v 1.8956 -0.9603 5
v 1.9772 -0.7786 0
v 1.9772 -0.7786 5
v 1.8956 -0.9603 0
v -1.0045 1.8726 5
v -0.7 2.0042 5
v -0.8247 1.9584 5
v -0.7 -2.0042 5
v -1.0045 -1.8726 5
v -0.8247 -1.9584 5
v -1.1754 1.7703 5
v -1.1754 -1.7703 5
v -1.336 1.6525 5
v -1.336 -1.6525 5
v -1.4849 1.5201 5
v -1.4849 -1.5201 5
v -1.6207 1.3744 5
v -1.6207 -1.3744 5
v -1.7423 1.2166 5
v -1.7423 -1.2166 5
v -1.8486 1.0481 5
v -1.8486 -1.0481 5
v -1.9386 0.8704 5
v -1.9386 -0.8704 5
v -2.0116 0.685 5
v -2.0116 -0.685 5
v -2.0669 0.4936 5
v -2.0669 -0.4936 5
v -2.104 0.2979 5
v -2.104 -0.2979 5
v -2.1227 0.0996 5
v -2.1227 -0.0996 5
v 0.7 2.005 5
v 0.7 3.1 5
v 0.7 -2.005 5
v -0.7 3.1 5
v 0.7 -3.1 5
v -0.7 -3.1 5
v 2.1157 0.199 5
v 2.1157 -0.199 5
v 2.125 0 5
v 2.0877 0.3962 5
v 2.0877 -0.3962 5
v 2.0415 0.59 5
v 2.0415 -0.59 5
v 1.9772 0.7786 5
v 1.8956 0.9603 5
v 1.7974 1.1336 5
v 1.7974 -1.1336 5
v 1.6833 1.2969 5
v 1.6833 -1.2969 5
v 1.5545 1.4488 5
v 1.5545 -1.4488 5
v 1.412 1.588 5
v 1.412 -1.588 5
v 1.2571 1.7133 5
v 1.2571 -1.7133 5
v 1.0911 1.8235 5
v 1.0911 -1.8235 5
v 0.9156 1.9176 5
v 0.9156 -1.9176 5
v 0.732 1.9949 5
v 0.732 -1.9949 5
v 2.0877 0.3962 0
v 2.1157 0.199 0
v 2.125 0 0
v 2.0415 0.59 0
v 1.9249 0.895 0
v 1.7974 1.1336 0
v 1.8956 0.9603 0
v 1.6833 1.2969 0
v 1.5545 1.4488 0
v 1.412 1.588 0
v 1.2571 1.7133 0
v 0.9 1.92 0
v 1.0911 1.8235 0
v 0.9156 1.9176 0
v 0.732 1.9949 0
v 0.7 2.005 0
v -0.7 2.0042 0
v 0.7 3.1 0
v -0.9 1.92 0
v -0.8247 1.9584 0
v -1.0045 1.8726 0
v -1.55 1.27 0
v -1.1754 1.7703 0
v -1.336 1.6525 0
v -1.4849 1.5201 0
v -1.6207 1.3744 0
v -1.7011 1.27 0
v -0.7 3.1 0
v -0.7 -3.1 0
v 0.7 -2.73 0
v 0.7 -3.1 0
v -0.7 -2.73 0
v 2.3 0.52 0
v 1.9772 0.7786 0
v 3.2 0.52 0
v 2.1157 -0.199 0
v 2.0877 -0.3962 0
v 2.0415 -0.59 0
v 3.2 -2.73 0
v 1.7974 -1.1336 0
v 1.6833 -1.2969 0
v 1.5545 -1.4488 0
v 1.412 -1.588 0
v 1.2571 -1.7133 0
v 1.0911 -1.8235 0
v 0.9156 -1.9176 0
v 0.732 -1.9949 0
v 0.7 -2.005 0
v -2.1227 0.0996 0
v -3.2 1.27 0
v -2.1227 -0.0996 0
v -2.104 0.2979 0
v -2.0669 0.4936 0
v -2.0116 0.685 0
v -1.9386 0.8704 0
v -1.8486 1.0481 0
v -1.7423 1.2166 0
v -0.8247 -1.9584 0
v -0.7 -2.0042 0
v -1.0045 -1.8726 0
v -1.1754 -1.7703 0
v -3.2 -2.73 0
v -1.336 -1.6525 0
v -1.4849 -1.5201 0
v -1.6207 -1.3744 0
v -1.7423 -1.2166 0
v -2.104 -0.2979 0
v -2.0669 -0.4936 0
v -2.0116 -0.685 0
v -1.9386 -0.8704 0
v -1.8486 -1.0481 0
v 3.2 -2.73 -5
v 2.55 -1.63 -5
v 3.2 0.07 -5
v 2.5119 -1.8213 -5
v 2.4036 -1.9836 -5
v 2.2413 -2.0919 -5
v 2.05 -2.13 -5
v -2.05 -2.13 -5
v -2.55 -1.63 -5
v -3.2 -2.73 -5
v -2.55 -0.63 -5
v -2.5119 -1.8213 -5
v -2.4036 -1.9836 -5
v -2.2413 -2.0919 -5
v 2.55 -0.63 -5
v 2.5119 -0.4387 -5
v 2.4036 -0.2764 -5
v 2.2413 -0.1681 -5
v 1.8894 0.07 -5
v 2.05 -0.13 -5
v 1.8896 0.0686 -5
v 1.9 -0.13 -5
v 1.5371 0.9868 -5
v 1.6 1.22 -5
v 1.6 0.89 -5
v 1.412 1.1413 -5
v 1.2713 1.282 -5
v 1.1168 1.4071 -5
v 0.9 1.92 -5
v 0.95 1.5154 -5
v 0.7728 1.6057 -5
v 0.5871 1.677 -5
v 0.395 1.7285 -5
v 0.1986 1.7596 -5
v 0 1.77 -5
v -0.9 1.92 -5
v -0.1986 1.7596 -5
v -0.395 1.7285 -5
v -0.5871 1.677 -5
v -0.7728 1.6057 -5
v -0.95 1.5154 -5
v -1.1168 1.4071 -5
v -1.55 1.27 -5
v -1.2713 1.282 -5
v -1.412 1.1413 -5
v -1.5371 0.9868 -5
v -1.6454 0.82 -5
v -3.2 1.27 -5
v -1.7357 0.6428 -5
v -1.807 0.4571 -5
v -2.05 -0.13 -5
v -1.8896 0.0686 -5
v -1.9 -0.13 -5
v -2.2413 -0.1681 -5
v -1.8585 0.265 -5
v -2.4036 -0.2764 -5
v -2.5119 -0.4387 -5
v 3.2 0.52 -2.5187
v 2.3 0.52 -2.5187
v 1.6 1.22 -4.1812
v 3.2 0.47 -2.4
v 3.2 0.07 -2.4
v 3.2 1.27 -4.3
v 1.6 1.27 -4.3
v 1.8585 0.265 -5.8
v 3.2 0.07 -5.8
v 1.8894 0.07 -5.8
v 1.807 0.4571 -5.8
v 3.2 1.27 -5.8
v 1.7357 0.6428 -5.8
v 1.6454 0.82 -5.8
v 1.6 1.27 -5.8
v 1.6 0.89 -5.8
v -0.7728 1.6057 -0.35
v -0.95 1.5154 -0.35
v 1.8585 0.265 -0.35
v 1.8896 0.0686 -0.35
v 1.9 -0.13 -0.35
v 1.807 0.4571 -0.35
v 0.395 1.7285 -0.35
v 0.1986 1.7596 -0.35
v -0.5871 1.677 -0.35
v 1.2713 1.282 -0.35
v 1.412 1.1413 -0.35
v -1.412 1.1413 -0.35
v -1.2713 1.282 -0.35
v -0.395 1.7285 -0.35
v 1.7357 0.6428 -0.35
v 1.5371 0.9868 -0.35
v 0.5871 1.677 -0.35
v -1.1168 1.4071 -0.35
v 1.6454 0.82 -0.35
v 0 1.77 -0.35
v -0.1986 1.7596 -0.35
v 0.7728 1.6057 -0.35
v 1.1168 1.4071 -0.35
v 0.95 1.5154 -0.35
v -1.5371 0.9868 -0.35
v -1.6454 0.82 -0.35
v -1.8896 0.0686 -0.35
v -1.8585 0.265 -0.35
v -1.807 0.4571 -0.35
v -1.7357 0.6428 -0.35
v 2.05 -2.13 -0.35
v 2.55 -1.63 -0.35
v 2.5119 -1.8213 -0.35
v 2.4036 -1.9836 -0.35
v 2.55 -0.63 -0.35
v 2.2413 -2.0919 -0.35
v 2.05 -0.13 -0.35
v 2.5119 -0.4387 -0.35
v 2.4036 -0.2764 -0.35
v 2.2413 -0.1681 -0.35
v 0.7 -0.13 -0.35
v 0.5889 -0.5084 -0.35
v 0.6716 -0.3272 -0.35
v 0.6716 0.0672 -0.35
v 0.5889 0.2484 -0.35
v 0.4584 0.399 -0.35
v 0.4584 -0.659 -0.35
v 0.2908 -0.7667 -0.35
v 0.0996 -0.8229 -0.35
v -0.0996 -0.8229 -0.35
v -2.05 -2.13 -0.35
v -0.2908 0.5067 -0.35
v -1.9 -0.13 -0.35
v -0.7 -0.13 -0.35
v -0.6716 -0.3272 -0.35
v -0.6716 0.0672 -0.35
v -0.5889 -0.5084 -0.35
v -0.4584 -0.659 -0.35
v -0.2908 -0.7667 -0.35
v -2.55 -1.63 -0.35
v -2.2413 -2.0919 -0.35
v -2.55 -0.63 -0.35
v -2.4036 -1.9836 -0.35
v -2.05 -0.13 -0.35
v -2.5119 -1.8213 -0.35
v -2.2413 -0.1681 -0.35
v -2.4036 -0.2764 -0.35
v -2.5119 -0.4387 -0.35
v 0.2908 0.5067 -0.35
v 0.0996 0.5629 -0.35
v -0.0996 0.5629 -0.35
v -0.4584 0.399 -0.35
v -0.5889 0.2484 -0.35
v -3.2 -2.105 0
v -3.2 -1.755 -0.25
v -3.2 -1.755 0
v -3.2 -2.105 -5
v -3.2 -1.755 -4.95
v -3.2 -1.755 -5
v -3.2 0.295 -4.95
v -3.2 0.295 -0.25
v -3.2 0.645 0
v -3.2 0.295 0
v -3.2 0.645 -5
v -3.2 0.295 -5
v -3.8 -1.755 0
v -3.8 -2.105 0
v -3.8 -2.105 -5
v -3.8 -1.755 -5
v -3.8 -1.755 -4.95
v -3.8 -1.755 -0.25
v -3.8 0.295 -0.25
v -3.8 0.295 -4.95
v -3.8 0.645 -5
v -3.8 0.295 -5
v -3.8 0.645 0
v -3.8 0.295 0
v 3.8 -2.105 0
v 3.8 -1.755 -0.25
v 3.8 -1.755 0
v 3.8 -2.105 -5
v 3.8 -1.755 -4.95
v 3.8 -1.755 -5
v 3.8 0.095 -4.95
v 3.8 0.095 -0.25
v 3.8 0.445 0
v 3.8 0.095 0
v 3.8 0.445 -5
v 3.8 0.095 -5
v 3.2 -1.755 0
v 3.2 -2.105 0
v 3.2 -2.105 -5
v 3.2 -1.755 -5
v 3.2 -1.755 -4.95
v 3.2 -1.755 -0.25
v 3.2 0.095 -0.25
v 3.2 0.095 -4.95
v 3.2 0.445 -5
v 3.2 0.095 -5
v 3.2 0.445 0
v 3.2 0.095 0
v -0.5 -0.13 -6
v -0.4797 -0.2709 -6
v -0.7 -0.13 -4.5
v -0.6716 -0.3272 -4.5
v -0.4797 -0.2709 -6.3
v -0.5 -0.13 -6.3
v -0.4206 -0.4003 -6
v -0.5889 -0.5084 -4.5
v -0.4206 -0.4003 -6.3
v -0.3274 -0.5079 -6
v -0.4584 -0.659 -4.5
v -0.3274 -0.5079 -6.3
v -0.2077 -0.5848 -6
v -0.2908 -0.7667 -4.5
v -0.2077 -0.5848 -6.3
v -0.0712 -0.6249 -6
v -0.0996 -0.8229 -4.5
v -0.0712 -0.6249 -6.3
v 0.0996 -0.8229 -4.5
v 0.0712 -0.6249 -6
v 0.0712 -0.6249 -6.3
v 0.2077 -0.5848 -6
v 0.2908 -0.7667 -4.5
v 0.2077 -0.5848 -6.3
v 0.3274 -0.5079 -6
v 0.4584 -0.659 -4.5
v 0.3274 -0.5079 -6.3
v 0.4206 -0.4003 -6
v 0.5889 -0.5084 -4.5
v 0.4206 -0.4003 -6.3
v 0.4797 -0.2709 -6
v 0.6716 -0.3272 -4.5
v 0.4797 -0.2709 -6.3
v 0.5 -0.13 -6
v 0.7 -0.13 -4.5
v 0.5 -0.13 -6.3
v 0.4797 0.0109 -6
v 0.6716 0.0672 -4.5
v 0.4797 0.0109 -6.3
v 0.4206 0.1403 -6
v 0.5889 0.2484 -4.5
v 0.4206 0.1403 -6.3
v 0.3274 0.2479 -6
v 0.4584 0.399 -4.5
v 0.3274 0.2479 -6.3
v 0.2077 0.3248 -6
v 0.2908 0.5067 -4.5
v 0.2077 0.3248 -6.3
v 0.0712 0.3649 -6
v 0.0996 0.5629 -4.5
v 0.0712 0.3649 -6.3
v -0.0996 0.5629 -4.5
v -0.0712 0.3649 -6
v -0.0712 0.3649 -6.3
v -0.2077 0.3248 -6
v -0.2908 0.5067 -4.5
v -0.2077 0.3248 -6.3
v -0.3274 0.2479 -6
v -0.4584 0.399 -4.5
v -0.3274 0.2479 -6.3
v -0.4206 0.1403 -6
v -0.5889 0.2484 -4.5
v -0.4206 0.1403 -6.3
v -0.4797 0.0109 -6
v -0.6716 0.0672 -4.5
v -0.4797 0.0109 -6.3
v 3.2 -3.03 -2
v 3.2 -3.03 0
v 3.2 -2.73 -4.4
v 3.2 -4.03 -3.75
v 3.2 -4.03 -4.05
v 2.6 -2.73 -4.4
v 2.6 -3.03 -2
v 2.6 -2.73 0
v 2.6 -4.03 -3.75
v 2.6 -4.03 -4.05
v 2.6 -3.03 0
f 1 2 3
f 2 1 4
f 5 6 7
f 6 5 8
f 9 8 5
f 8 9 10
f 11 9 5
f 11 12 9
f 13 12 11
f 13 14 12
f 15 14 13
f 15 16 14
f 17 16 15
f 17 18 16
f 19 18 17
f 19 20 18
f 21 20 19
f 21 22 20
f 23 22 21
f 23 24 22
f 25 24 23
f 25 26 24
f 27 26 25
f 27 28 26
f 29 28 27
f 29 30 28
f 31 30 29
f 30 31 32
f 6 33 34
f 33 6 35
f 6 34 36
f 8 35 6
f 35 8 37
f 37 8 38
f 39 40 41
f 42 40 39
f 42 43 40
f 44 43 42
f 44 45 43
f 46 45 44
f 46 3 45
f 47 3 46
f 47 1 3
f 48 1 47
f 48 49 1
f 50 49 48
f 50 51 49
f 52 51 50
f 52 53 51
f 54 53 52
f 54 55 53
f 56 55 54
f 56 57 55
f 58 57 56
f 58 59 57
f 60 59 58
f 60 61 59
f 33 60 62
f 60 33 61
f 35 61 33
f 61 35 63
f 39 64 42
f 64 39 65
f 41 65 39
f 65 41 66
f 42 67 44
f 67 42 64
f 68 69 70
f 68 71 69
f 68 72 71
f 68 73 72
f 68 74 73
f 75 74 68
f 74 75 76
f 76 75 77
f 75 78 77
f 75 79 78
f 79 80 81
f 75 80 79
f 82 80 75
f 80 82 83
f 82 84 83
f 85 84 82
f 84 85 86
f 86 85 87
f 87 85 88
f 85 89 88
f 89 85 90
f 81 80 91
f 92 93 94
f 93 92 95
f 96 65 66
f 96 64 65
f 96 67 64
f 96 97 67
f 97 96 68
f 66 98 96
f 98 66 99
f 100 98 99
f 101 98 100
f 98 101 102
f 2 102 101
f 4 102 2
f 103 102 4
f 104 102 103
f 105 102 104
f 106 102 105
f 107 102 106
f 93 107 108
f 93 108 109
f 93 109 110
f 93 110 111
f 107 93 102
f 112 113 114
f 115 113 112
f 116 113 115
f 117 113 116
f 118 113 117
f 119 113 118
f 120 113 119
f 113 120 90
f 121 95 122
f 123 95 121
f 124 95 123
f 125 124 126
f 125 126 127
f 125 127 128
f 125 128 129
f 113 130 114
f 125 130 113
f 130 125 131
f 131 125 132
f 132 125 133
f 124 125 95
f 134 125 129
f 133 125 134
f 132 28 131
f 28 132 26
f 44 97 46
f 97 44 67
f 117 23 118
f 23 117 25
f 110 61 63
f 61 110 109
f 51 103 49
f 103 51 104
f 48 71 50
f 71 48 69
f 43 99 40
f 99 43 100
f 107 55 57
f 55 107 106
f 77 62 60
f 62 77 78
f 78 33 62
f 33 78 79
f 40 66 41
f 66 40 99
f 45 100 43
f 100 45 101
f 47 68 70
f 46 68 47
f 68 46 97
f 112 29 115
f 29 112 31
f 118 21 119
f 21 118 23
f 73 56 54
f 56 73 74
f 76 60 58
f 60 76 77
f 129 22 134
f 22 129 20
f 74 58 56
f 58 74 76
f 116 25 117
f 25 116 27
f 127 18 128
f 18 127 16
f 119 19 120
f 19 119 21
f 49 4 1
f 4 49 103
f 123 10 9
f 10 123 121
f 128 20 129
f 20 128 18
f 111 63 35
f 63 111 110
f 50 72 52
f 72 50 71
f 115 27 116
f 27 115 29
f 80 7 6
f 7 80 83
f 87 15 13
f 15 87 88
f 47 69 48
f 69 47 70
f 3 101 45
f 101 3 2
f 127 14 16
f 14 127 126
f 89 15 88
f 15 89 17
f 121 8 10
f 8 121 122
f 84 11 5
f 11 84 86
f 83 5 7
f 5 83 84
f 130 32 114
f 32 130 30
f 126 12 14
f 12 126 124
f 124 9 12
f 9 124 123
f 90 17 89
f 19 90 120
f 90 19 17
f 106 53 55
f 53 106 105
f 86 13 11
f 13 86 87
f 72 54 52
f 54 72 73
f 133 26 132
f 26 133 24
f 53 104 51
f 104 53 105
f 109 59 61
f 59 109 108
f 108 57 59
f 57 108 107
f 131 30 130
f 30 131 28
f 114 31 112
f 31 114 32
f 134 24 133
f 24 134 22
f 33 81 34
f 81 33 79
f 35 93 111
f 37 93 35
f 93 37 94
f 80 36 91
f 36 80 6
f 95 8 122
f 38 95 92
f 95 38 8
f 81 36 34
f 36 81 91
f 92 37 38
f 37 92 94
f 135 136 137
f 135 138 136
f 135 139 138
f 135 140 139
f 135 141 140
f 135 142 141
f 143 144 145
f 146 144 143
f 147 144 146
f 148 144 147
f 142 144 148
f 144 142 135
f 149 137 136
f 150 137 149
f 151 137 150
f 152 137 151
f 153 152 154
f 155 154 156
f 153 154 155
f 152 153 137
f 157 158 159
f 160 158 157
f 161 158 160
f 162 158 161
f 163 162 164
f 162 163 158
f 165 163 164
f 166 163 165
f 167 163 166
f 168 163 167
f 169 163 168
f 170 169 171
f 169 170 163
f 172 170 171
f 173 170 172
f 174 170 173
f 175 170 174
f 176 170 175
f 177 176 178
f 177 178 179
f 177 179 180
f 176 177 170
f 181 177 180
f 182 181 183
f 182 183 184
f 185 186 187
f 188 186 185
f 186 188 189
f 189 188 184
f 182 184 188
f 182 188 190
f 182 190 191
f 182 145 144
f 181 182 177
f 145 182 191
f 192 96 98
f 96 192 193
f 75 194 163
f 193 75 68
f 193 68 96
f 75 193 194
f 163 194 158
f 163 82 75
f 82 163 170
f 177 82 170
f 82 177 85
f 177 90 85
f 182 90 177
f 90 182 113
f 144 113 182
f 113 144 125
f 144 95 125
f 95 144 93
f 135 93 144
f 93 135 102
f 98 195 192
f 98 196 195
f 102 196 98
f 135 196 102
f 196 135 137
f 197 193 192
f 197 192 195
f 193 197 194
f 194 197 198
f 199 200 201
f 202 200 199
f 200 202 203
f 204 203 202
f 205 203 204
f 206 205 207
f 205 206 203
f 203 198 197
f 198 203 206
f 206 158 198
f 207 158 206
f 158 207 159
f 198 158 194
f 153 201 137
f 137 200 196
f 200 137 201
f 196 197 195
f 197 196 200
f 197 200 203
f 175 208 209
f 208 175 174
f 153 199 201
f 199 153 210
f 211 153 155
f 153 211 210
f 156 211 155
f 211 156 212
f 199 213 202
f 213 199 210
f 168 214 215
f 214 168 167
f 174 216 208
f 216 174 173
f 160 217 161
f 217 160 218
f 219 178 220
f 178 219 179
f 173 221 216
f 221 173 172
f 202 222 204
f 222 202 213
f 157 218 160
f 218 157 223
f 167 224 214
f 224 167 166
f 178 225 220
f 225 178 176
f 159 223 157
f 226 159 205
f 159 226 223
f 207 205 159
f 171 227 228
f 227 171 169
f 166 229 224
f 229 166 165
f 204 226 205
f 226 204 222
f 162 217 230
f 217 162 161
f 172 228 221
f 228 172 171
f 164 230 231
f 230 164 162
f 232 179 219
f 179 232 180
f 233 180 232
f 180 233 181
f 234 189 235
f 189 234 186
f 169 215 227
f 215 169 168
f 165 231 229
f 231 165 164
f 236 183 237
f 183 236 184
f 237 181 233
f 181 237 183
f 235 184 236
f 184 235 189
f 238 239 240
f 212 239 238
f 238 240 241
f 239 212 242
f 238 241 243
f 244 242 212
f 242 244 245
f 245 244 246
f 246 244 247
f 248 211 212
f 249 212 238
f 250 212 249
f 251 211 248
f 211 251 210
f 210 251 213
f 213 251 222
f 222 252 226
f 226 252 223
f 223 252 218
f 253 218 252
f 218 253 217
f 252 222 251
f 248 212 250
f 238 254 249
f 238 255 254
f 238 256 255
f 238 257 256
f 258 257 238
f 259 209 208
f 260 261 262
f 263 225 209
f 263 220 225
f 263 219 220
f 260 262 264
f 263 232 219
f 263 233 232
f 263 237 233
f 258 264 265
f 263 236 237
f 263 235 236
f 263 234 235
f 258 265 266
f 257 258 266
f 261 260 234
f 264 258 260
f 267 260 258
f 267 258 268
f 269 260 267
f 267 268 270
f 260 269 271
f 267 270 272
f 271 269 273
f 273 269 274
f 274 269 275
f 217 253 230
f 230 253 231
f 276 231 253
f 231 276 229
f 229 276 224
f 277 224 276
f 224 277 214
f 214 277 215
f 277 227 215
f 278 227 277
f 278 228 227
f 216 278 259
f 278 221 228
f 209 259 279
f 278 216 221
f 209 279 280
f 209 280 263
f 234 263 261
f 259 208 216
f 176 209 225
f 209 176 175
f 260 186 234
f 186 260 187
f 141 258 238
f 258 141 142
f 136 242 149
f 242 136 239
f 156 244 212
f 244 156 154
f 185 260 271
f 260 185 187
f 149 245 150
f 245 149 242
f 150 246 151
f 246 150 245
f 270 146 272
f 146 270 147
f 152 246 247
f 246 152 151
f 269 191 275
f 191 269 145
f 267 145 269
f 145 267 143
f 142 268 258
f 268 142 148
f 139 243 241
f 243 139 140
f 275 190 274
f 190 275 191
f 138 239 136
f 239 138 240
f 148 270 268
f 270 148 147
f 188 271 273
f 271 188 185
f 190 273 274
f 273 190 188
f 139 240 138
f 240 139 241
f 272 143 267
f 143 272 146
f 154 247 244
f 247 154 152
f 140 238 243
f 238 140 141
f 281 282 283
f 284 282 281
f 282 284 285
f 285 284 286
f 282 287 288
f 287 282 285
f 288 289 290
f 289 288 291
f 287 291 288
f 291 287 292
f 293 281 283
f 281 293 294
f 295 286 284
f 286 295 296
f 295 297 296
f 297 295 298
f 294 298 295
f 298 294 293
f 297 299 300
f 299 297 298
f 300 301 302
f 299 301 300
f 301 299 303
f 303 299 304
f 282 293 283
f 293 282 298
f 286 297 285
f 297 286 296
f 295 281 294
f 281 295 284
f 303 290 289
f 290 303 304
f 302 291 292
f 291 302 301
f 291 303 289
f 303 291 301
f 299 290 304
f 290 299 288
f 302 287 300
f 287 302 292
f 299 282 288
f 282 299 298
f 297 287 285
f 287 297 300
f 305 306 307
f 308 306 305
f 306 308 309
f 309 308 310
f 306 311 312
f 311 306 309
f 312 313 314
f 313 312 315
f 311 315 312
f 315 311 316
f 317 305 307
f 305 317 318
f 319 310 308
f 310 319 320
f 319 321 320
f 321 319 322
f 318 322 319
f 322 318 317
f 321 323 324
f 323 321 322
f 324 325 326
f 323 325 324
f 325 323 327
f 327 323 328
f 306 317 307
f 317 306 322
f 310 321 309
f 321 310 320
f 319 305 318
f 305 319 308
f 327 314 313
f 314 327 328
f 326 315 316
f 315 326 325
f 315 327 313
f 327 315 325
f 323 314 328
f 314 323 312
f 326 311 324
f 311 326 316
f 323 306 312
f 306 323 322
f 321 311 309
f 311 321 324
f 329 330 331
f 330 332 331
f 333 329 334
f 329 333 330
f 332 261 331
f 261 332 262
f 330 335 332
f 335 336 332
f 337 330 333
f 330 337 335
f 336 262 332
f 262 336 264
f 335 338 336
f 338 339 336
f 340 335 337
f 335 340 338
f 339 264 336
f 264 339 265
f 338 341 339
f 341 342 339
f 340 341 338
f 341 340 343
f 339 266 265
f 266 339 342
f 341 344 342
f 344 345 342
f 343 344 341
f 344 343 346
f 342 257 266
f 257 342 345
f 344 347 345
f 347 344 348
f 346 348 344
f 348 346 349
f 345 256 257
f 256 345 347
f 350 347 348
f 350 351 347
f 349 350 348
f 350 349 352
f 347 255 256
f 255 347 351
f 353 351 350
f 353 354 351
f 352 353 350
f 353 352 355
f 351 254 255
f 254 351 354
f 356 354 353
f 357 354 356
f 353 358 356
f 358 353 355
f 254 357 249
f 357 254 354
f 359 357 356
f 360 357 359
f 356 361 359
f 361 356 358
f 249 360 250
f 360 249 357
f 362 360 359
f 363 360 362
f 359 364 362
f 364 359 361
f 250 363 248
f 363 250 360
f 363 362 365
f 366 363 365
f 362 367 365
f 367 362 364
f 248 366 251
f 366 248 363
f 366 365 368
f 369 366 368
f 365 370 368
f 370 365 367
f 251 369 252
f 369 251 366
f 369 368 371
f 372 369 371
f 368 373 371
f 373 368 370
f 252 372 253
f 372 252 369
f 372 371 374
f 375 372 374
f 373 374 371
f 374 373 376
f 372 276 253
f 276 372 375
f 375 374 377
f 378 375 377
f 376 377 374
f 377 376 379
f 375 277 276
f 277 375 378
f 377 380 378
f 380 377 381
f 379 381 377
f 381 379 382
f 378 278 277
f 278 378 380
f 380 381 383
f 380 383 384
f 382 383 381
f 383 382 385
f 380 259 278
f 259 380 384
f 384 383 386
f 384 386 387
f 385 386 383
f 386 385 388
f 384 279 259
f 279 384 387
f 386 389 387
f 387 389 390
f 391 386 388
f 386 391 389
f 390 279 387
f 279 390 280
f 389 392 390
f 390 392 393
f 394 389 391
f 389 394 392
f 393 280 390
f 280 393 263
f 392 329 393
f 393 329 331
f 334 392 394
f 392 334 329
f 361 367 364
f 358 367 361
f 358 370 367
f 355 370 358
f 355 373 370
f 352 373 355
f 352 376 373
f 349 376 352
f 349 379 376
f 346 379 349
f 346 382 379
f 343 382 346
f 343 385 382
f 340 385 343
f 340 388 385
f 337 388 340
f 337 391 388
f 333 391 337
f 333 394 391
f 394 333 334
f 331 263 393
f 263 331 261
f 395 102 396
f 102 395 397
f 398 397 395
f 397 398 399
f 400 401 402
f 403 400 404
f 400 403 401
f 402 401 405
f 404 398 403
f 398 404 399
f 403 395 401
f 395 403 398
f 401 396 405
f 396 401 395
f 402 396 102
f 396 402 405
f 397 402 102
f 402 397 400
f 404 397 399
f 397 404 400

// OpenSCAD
$fa = 1;
$fs = 0.2;

// Cap type
cap_type = "Atari XE ◎"; // [KailhBox, Atari XE ■, Atari XE ◎, Atari XL Alps ▬, Atari XL ✚, Atari XL ⧇]

// Stem type
stem_type = "Kailh Box Pink"; // [Kailh Box Pink, Kailh Choc v1, MX Adapter]

// Revision
rev = "12";

// Carve revision
carve_rev = false;

module nil() {}

box_width = 6.40;
box_height = 4.7;
box_inner_width = 6;
box_inner_corner_radius = 2;
box_cross_x_thickness = 1.3;
box_cross_y_thickness = 1.1;
box_cross_width = 4;
box_bottom_thickness = 0.7;
box_bottom_outer_offset = 0.02;
extra_floor = 1;

module kailh_box() {
  union() {
    difference() {
      cube([box_width, box_width, box_height], center = true);
      minkowski() {
        cube([
          box_inner_width - box_inner_corner_radius * 2,
          box_inner_width - box_inner_corner_radius * 2,
          box_height + 0.1], center = true);
        cylinder(r = box_inner_corner_radius);
      }
    };
    cube([box_cross_width, box_cross_x_thickness, box_height], center = true);
    cube([box_cross_y_thickness, box_cross_width, box_height], center = true);
    translate([0, 0, (box_bottom_thickness - box_height) / 2])
      cube([box_width, box_width, box_bottom_thickness], center = true);
  }
}

atari_box_width = 6.40;
atari_box_height = 4.7;
atari_square_width = 3.2;
atari_square_depth = 2.8;
atari_square_circle_radius = atari_square_width * sqrt(2) / 2;
atari_box_bottom_thickness = 0.7;
atari_box_bottom_outer_offset = 0.05;

module atarixe_square() {
  union() {
    difference() {
      cube([atari_box_width, atari_box_width, atari_box_height], center = true);
      cube([atari_square_width, atari_square_width, atari_box_height + 0.1], center = true);
      translate([0, 0, (atari_square_depth - 1) / 2])
        cylinder(r = atari_square_circle_radius, h = atari_box_height - atari_square_depth + 0.1);
      // Add a recess at the bottom so if resin residues cling in the angles, they do so without preventing the cap from going in completely.
      rotate([0, 0, 45])
        translate([0, 0, 1 - atari_square_depth])
          cylinder(h = 1, d1 = atari_square_circle_radius * 2 + 1, d2 = atari_square_circle_radius * 2, $fn = 4);
    }
    translate([0, 0, (atari_box_bottom_thickness - atari_box_height) / 2])
      cube([atari_box_width, atari_box_width, atari_box_bottom_thickness], center = true);
  }
}

atari_circle_inner_diameter = 4.25;
atari_circle_wing_thickness = 1.40;
atari_circle_depth = 4.0;

module atarixe_circle() {
  union() {
    cylinder(r = atari_circle_inner_diameter / 2, h = atari_circle_depth + extra_floor);
    translate([0, 0, (atari_circle_depth + extra_floor) / 2])
      cube([atari_circle_wing_thickness, atari_box_width - 0.2, atari_circle_depth + extra_floor], center = true);
  }
}

atari_alps_width = 4.6;
atari_alps_depth = 2.3;
atari_alps_height = box_height - 2;
atari_alps_offset = 0;
atari_alps_teeth_width = 0.4;
atari_alps_teeth_depth = 0.2;

module atarixl_alps() {
  union() {
    difference() {
      cube([box_width, box_width, box_height], center = true);
      translate([0, atari_alps_offset + atari_alps_teeth_depth, (box_height - atari_alps_height) / 2 + 0.1])
        difference() {
          cube([atari_alps_width, atari_alps_depth + atari_alps_teeth_depth, atari_alps_height + 0.1], center = true);
          translate([atari_alps_width / 4, atari_alps_depth / 2 + 0.05, 0])
            cube([atari_alps_teeth_width, atari_alps_teeth_depth + 0.05, atari_alps_height], center = true);
          translate([-atari_alps_width / 4, atari_alps_depth / 2 + 0.05, 0])
            cube([atari_alps_teeth_width, atari_alps_teeth_depth + 0.05, atari_alps_height], center = true);
        }
    };
    translate([0, 0, (box_bottom_thickness - box_height) / 2])
      cube([box_width, box_width, box_bottom_thickness], center = true);
  }
}

atarixl_cross_thickness = 1.3;
atarixl_cross_size = 4.4;
atarixl_cross_height = 3.5;

module atarixl_cross() {
  translate([0, 0, -0.05])
    union() {
      cube([atarixl_cross_thickness, atarixl_cross_size, atarixl_cross_height + 0.1], center = true);
      cube([atarixl_cross_size, atarixl_cross_thickness, atarixl_cross_height + 0.1], center = true);
    }
}

atarixl_square_size = 4.7;
atarixl_square_height = 4;

module atarixl_square() {
  union() {
    cube([atarixl_square_size, atarixl_square_size, atarixl_square_height], center = true);
    translate([0, 0, -atarixl_square_height / 2])
      cube([atarixl_square_size / 2, atarixl_square_size / 2, 0.1], center = true);
  }
}

kailh_stem_horizontal_offset = 0.47;
kailh_stem_spring_column_height = 6.3;
kailh_stem_spring_column_bottom_diameter = 1.40;
kailh_stem_spring_column_upper_diameter = 1;
kailh_stem_spring_column_top_height = 0.3;
kailh_stem_spring_column_cone_height = 1.5;
kailh_stem_spring_column_offset = -0.60;
kailh_stem_main_height = 5;
kailh_stem_main_width = box_width;
kailh_stem_main_depth_left = 4.0;
kailh_stem_main_depth_middle = 4.65;
kailh_stem_main_depth_right = 3.25;
kailh_stem_main_extension_width = 1.8;
kailh_stem_main_hole_diameter = 3.8;
kailh_stem_main_hole_width = 5.1;
kailh_stem_main_hole_depth = 2;
kailh_stem_main_hole_corner_radius = 0.5;
kailh_stem_rail_thickness = 0.6;
kailh_stem_rail_width = 0.35;
kailh_stem_rail3_width = 4.70;
kailh_stem_left_rail1_x = 0.8;
kailh_stem_left_rail2_x = 3.2;
kailh_stem_left_rail3_y = 2.9;
kailh_stem_right_rail1_x = 0.8;
kailh_stem_right_rail2_x = 3.0;
kailh_stem_right_rail3_y = 2.9;
kailh_clicker_top_height = 1.3;
kailh_clicker_top_length = 0.3;
kailh_clicker_rail_height = 0.3;
kailh_clicker_gentle_slope_length = 1.75;
kailh_clicker_steep_slope_length = 0.35;
kailh_clicker_flat_length = 2;
kailh_clicker_rail_width = 0.6;
kailh_breaker_width = 1.6;
kailh_breaker_flat_length = 1.5;
kailh_breaker_slope_length = 1.9;
kailh_breaker_top = 0.8;
kailh_breaker_outcrop = 0.8;
kailh_breaker_bottom = -0.4;

kailh_stem_height = kailh_stem_spring_column_height;

module kailh_rails(rail1_x, rail2_x, rail3_y, rail_width, rail_thickness, rail3_width) {
  translate([0, rail1_x, (kailh_stem_spring_column_height - kailh_stem_main_height) / 2])
    cube([rail_thickness, rail_width, kailh_stem_main_height], center = true);
  translate([0, rail2_x, (kailh_stem_spring_column_height - kailh_stem_main_height) / 2])
    cube([rail_thickness, rail_width, kailh_stem_main_height], center = true);
  translate([0, (rail2_x + rail1_x) / 2, rail3_y - rail3_width / 2])
    cube([rail_thickness, rail2_x - rail1_x - rail_width, rail3_width], center = true);
}

module kailh_stem() {
  union() {
    // Main part
    translate([0, 0, (kailh_stem_spring_column_height - kailh_stem_main_height) / 2])
      difference() {
        union() {
          linear_extrude(height = kailh_stem_main_height, center = true) {
            polygon(points = [
              [-kailh_stem_main_width / 2, -box_width / 2],
              [kailh_stem_main_width / 2, -box_width / 2],
              [kailh_stem_main_width / 2, kailh_stem_main_depth_right - box_width / 2],
              [kailh_stem_main_extension_width / 2 + (kailh_stem_main_depth_middle - kailh_stem_main_depth_right), kailh_stem_main_depth_right - box_width / 2],
              [kailh_stem_main_extension_width / 2, kailh_stem_main_depth_middle - box_width / 2],
              [-kailh_stem_main_extension_width / 2, kailh_stem_main_depth_middle - box_width / 2],
              [-kailh_stem_main_extension_width / 2 - (kailh_stem_main_depth_middle - kailh_stem_main_depth_left), kailh_stem_main_depth_left - box_width / 2],
              [-kailh_stem_main_width / 2, kailh_stem_main_depth_left - box_width / 2],
            ], convexity = 10);
          }
          // Contact breaker
          kailh_breaker_height = kailh_breaker_slope_length + kailh_breaker_flat_length;
          translate([kailh_stem_main_width / 2, 0, kailh_breaker_height - kailh_stem_main_height / 2 - kailh_breaker_outcrop])
            rotate([-90, 0, 90])
              linear_extrude(height = kailh_breaker_width) {
                polygon(points = [
                  [kailh_breaker_bottom, 0],
                  [0, 0],
                  [kailh_breaker_top, kailh_breaker_slope_length],
                  [kailh_breaker_top, kailh_breaker_height],
                  [kailh_breaker_bottom, kailh_breaker_height]
                ], convexity = 4);
              }
        }
        translate([0, kailh_stem_spring_column_offset, 0])
          union() {
            translate([0, 0, -extra_floor/2 - 0.5])
              cylinder(r = kailh_stem_main_hole_diameter / 2, h = kailh_stem_height - extra_floor + 1, center = true);
            hull() {
              translate([kailh_stem_main_hole_corner_radius - kailh_stem_main_hole_width / 2, -kailh_stem_main_hole_corner_radius, -extra_floor])
                cylinder(r = kailh_stem_main_hole_corner_radius, h = kailh_stem_height - extra_floor + 1, center = true);
              translate([kailh_stem_main_hole_width / 2 - kailh_stem_main_hole_corner_radius, -kailh_stem_main_hole_corner_radius, -extra_floor])
                cylinder(r = kailh_stem_main_hole_corner_radius, h = kailh_stem_height - extra_floor + 1, center = true);
              translate([kailh_stem_main_hole_corner_radius - kailh_stem_main_hole_width / 2, kailh_stem_main_hole_corner_radius - kailh_stem_main_hole_depth, -extra_floor])
                cylinder(r = kailh_stem_main_hole_corner_radius, h = kailh_stem_height - extra_floor + 1, center = true);
              translate([kailh_stem_main_hole_width / 2 - kailh_stem_main_hole_corner_radius, kailh_stem_main_hole_corner_radius - kailh_stem_main_hole_depth, -extra_floor])
                cylinder(r = kailh_stem_main_hole_corner_radius, h = kailh_stem_height - extra_floor + 1, center = true);
            }
          }
        // Revision number
        if (carve_rev) {
          translate([2.2, -box_width / 2 + 0.2, 2])
            rotate([90, 180, 0])
              linear_extrude(height = 0.4)
                text(rev, size = 3);
        }
      }
    // Spring cone
    translate([0, kailh_stem_spring_column_offset, kailh_stem_spring_column_height / 2])
      rotate([180, 0, 0])
        rotate_extrude()
          polygon(points = [
            [0, 0],
            [kailh_stem_spring_column_bottom_diameter / 2, 0],
            [kailh_stem_spring_column_bottom_diameter / 2, kailh_stem_spring_column_height - kailh_stem_spring_column_cone_height - kailh_stem_spring_column_top_height],
            [kailh_stem_spring_column_upper_diameter / 2, kailh_stem_spring_column_height - kailh_stem_spring_column_top_height],
            [kailh_stem_spring_column_upper_diameter / 2, kailh_stem_spring_column_height],
            [0, kailh_stem_spring_column_height]
          ], convexity = 4);
    // Rails
    translate([-(kailh_stem_main_width + kailh_stem_rail_thickness) / 2, -kailh_stem_main_width / 2, 0])
      kailh_rails(kailh_stem_left_rail1_x, kailh_stem_left_rail2_x, kailh_stem_left_rail3_y, kailh_stem_rail_width, kailh_stem_rail_thickness, kailh_stem_rail3_width);
    translate([(kailh_stem_main_width + kailh_stem_rail_thickness) / 2, -kailh_stem_main_width / 2, 0])
      kailh_rails(kailh_stem_right_rail1_x, kailh_stem_right_rail2_x, kailh_stem_right_rail3_y, kailh_stem_rail_width, kailh_stem_rail_thickness, kailh_stem_rail3_width);
    // Clicker
    kailh_clicker_height = kailh_clicker_flat_length + kailh_clicker_gentle_slope_length + kailh_clicker_top_length + kailh_clicker_steep_slope_length;
    translate([kailh_stem_main_width / 2, -box_width / 2, kailh_stem_height / 2])
      rotate([0, 90, 180])
        linear_extrude(height = kailh_clicker_rail_width) {
          polygon(points = [
            [0, 0],
            [0, kailh_clicker_rail_height],
            [kailh_clicker_flat_length, kailh_clicker_rail_height],
            [kailh_clicker_flat_length + kailh_clicker_gentle_slope_length, kailh_clicker_top_height],
            [kailh_clicker_flat_length + kailh_clicker_gentle_slope_length + kailh_clicker_top_length, kailh_clicker_top_height],
            [kailh_clicker_height, 0]
          ], convexity = 4);
      }
  }
}

kailh_choc_height = 3.0 * 2;
kailh_choc_base_dimensions = [9.0, 3.95, 1.0];
kailh_choc_insert_distance = 5.7;
kailh_choc_insert_dimensions = [1.0, 2.6, 3.6];
//kailh_choc_height_under_cap = cap_type == "Atari XL ✚" ? 2.8 : 0; // Atari XL ⧇: 1.9
//kailh_choc_switch_top_height = 2.5;

module kailh_choc() {
  translate([0, 0, kailh_choc_height / 2])
    cube(kailh_choc_base_dimensions, center = true);
  translate([kailh_choc_insert_distance / 2, 0, kailh_choc_height / 4])
    cube(kailh_choc_insert_dimensions, center = true);
  translate([-kailh_choc_insert_distance / 2, 0, kailh_choc_height / 4])
    cube(kailh_choc_insert_dimensions, center = true);
}

mxadapter_stem_height = 3.5;
mxadapter_stem_diameter = 5.55;
mxadapter_cross_thickness = 1.35;
mxadapter_cross_size = 4.2;
mxadapter_floor_thickness = 0.1;

module mx_adapter() {
  difference() {
    cylinder(r = mxadapter_stem_diameter / 2, h = mxadapter_stem_height, center = true);
    translate([0, 0, -mxadapter_floor_thickness * 1.5]) {
      cube([mxadapter_cross_thickness, mxadapter_cross_size, mxadapter_stem_height + mxadapter_floor_thickness], center = true);
      cube([mxadapter_cross_size, mxadapter_cross_thickness, mxadapter_stem_height + mxadapter_floor_thickness], center = true);
    }
  }
}

union() {
  if (cap_type == "KailhBox") {
    translate([0, 0, box_height / 2])
      kailh_box();
  }
  if (cap_type == "Atari XE ■") {
    translate([0, 0, atari_box_height / 2])
      atarixe_square();
  }
  if (cap_type == "Atari XE ◎") {
    extra_floor = 1;
    atarixe_circle();
  }
  if (cap_type == "Atari XL Alps ▬") {
    translate([0, 0, box_height / 2])
      atarixl_alps();
  }
  if (cap_type == "Atari XL ✚") {
    translate([0, 0, atarixl_cross_height / 2])
      atarixl_cross();
  }
  if (cap_type == "Atari XL ⧇") {
    translate([0, 0, atarixl_square_height / 2])
      atarixl_square();
  }
  if (stem_type == "Kailh Box Pink") {
    translate([0, kailh_stem_horizontal_offset, -kailh_stem_height / 2])
      kailh_stem();
  }
  if (stem_type == "Kailh Choc v1") {
    translate([0, 0, -kailh_choc_height / 2])
      kailh_choc();
  }
  if (stem_type == "MX Adapter") {
    translate([0, 0, -mxadapter_stem_height / 2])
      mx_adapter();
  }
}
